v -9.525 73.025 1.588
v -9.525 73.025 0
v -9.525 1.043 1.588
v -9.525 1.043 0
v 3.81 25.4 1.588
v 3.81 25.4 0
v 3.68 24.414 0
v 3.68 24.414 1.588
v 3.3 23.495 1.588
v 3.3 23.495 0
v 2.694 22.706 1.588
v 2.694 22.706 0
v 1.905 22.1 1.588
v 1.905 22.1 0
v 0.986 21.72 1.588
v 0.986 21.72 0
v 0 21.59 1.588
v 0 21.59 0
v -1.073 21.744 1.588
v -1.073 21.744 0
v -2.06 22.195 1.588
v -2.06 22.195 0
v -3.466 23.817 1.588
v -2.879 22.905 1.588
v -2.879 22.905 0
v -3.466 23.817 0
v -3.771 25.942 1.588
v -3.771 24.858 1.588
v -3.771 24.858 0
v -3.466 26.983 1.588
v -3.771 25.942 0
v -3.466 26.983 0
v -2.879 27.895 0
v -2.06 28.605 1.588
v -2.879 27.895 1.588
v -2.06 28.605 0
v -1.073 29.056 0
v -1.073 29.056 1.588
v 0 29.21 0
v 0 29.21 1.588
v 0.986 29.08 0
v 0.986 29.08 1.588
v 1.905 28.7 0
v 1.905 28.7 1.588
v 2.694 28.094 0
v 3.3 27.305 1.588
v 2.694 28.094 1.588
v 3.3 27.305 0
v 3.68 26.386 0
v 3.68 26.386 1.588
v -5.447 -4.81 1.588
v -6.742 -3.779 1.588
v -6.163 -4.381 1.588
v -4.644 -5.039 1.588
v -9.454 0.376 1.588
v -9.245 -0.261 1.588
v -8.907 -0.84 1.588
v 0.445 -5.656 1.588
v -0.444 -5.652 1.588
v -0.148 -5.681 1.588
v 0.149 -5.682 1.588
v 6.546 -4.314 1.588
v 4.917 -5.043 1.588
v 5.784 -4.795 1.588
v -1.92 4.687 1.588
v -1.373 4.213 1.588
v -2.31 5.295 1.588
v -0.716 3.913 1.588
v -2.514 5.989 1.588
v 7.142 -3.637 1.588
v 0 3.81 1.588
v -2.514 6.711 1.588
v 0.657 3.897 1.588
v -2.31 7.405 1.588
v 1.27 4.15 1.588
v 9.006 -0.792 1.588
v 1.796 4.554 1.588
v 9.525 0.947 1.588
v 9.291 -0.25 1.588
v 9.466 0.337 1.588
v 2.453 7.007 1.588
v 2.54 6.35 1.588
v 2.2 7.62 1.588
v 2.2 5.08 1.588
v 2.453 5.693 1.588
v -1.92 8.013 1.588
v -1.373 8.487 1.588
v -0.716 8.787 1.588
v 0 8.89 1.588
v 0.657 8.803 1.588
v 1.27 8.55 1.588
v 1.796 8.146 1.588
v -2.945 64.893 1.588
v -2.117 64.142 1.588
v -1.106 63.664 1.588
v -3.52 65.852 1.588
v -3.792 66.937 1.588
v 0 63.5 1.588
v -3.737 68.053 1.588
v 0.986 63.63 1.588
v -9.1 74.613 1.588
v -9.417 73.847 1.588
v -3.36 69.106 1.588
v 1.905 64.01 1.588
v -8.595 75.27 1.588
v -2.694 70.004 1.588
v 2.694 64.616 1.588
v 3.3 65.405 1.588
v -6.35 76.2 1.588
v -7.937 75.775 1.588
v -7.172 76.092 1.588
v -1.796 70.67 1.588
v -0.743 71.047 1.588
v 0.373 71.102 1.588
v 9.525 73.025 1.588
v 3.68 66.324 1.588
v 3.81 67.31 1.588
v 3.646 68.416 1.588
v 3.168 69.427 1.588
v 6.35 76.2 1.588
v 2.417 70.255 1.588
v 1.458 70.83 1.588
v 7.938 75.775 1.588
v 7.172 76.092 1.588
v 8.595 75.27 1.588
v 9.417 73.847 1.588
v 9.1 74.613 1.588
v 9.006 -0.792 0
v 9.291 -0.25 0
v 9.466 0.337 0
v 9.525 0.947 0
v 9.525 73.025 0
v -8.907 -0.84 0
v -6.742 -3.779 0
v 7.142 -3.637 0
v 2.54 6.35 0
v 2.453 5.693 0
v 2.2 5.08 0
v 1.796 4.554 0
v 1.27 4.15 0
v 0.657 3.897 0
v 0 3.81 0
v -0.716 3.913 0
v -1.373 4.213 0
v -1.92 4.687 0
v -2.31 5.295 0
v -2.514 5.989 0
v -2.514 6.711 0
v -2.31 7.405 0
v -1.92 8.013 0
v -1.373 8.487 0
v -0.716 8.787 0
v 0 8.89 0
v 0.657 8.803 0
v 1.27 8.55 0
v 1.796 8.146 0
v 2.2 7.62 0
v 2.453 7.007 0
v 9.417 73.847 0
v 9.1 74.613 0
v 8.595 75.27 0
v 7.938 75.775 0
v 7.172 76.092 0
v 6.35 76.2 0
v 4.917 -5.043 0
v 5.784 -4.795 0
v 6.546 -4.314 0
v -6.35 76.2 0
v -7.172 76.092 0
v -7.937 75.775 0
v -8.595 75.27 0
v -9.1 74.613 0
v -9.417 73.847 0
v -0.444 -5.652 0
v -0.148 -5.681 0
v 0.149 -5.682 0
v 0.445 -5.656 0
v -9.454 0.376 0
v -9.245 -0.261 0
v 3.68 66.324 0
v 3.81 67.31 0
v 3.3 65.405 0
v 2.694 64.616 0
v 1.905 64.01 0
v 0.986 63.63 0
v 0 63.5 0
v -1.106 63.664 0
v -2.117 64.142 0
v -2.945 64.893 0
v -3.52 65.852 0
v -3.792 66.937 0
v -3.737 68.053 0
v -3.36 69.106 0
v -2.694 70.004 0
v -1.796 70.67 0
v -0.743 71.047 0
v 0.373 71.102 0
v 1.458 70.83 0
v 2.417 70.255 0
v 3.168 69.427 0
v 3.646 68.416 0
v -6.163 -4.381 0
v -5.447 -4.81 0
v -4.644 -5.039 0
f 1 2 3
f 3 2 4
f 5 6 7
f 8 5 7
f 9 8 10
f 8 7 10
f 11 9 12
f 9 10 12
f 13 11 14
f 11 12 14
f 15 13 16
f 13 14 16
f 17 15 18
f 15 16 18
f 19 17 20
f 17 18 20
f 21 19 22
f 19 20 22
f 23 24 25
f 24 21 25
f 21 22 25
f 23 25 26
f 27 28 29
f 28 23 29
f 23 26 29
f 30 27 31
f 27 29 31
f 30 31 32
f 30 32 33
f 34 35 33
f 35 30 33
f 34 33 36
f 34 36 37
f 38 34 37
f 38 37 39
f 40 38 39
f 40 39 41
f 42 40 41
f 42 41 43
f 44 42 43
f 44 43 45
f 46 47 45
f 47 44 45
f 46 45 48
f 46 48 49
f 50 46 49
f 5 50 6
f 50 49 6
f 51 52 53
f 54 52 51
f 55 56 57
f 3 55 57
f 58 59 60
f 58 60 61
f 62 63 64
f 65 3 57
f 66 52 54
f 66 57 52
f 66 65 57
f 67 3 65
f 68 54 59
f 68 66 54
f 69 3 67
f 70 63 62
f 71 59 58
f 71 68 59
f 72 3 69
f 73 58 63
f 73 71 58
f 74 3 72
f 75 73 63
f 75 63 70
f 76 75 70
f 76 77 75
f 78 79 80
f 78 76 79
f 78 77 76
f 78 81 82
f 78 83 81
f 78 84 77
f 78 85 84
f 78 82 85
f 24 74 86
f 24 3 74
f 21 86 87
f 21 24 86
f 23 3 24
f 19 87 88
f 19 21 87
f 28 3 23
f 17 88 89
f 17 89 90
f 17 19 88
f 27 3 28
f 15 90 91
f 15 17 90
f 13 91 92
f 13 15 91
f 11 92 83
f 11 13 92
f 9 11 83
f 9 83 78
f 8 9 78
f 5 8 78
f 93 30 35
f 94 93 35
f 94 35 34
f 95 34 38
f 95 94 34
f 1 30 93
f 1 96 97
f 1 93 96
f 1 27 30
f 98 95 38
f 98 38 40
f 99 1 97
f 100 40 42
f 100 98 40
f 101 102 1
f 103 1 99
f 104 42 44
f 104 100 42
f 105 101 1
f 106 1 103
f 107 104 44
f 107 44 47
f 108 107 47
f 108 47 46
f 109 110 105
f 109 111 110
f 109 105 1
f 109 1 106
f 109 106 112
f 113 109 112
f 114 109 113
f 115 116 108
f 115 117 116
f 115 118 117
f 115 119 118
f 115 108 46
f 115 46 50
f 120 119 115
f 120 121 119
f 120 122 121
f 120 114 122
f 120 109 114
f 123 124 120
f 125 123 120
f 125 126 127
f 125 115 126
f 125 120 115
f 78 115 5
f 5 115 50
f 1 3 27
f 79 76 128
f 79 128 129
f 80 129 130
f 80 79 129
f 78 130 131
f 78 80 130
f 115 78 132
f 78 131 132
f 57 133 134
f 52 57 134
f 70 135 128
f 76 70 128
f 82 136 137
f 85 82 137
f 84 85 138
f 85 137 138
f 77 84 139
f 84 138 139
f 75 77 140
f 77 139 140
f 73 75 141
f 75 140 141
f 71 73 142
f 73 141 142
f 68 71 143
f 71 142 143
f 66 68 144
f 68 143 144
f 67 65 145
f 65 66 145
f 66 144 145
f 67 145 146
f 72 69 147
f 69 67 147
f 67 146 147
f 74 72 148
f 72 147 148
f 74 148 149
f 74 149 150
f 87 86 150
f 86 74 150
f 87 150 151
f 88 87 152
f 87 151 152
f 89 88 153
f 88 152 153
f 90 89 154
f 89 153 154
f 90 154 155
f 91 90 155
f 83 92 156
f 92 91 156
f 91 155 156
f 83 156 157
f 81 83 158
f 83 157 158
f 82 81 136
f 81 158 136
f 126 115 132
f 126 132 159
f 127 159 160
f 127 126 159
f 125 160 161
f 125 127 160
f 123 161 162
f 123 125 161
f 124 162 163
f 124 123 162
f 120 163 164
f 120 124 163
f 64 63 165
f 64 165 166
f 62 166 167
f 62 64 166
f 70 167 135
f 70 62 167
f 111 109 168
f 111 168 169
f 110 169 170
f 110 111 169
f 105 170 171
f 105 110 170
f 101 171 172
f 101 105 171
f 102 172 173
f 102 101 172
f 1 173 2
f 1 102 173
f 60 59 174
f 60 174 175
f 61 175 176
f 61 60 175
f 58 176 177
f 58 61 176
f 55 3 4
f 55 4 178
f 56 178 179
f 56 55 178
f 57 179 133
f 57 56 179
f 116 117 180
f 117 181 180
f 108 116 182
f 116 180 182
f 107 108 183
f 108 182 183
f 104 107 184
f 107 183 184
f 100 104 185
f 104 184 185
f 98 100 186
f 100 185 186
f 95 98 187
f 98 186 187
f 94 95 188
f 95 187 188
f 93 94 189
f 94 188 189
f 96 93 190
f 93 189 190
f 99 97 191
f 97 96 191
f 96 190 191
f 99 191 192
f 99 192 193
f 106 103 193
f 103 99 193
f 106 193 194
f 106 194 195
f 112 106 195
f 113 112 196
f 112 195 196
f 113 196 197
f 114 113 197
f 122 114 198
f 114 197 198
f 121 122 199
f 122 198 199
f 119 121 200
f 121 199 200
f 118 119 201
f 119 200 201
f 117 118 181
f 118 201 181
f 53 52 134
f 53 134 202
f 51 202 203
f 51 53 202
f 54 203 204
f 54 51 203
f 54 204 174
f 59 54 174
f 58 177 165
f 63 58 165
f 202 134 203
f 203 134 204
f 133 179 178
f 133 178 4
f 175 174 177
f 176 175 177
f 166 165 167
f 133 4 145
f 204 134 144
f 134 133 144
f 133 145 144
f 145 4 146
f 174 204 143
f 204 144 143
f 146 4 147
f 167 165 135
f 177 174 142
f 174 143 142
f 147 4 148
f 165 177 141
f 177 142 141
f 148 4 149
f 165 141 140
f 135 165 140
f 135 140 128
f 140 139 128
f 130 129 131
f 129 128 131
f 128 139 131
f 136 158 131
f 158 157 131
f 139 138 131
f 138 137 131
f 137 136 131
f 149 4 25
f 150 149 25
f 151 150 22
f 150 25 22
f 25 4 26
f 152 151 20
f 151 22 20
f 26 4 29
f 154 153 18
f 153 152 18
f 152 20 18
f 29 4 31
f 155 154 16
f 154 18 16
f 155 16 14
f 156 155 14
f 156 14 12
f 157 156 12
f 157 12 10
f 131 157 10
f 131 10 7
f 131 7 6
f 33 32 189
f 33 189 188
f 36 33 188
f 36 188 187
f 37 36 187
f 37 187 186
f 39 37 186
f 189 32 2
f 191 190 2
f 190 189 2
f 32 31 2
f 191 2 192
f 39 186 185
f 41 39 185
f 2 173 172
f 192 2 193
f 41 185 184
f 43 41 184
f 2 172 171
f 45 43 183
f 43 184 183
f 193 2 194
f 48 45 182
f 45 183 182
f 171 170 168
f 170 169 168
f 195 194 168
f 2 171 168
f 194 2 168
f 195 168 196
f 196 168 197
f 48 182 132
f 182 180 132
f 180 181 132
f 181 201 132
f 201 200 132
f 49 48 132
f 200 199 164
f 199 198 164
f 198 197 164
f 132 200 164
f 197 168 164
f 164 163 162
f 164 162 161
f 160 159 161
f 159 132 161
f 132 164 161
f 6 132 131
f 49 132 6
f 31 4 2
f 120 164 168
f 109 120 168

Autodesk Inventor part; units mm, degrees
ref_plane "YZ Plane" through (0, 0, 0) normal (1, 0, 0) x (0, 1, 0)
ref_plane "XZ Plane" through (0, 0, 0) normal (0, 1, 0) x (-1, 0, 0)
ref_plane "XY Plane" through (0, 0, 0) normal (0, 0, 1) x (1, 0, 0)
sketch "Sketch1" plane through (0, 0, 0) normal (0, 0, 1) x (1, 0, 0)
  line L0 (0, 0) -> (12.7, 0)
  line L1 (9.525, 0) -> (9.525, 76.2)
  line L2 (9.525, 76.2) -> (-9.525, 76.2)
  line L3 (-9.525, 76.2) -> (-9.525, 0)
  line L4 (-9.525, 0) -> (0, -5.7165)
  line L5 (0, -5.7165) -> (9.525, 0)
  line L6 (-9.525, 0) -> (-5.9562, -4.8471)
  line L7 (-5.9562, -4.8471) -> (0, -5.7165)
  line L8 (0, -5.7165) -> (6.35, -4.8471)
  line L9 (6.35, -4.8471) -> (9.525, 0)
  line L10 (-9.525, 0) -> (0, 0)
  line L11 (0, 0) -> (0, 6.35)
  line L12 (0, 6.35) -> (0, 25.4)
  circle A0 centre (0, 25.4) radius 3.81
  circle A1 centre (0, 6.35) radius 2.54
  line L13 (0, 21.59) -> (0, 8.89)
  line L14 (0, 29.21) -> (0, 67.31)
  circle A2 centre (0, 67.31) radius 3.81
  dimension "d29" = 5.08
  dimension "d7" = 76.2
  dimension "d22" = 6.35
  dimension "d23" = 19.05
  dimension "d28" = 7.62
  dimension "d30" = 38.1
  dimension "d31" = 7.62
extrude "Extrusion5" add sketch "Sketch1" along normal blind 1.5875
fillet "Fillet4" radius 3.175 7 edges at (6.35, -4.8471, 0.7937) (9.525, 0, 0.7937) (0, -5.7165, 0.7937) (-5.9562, -4.8471, 0.7937) (-9.525, 0, 0.7937) (9.525, 76.2, 0.7937) (-9.525, 76.2, 0.7937)
properties part number "PTOPoly"
